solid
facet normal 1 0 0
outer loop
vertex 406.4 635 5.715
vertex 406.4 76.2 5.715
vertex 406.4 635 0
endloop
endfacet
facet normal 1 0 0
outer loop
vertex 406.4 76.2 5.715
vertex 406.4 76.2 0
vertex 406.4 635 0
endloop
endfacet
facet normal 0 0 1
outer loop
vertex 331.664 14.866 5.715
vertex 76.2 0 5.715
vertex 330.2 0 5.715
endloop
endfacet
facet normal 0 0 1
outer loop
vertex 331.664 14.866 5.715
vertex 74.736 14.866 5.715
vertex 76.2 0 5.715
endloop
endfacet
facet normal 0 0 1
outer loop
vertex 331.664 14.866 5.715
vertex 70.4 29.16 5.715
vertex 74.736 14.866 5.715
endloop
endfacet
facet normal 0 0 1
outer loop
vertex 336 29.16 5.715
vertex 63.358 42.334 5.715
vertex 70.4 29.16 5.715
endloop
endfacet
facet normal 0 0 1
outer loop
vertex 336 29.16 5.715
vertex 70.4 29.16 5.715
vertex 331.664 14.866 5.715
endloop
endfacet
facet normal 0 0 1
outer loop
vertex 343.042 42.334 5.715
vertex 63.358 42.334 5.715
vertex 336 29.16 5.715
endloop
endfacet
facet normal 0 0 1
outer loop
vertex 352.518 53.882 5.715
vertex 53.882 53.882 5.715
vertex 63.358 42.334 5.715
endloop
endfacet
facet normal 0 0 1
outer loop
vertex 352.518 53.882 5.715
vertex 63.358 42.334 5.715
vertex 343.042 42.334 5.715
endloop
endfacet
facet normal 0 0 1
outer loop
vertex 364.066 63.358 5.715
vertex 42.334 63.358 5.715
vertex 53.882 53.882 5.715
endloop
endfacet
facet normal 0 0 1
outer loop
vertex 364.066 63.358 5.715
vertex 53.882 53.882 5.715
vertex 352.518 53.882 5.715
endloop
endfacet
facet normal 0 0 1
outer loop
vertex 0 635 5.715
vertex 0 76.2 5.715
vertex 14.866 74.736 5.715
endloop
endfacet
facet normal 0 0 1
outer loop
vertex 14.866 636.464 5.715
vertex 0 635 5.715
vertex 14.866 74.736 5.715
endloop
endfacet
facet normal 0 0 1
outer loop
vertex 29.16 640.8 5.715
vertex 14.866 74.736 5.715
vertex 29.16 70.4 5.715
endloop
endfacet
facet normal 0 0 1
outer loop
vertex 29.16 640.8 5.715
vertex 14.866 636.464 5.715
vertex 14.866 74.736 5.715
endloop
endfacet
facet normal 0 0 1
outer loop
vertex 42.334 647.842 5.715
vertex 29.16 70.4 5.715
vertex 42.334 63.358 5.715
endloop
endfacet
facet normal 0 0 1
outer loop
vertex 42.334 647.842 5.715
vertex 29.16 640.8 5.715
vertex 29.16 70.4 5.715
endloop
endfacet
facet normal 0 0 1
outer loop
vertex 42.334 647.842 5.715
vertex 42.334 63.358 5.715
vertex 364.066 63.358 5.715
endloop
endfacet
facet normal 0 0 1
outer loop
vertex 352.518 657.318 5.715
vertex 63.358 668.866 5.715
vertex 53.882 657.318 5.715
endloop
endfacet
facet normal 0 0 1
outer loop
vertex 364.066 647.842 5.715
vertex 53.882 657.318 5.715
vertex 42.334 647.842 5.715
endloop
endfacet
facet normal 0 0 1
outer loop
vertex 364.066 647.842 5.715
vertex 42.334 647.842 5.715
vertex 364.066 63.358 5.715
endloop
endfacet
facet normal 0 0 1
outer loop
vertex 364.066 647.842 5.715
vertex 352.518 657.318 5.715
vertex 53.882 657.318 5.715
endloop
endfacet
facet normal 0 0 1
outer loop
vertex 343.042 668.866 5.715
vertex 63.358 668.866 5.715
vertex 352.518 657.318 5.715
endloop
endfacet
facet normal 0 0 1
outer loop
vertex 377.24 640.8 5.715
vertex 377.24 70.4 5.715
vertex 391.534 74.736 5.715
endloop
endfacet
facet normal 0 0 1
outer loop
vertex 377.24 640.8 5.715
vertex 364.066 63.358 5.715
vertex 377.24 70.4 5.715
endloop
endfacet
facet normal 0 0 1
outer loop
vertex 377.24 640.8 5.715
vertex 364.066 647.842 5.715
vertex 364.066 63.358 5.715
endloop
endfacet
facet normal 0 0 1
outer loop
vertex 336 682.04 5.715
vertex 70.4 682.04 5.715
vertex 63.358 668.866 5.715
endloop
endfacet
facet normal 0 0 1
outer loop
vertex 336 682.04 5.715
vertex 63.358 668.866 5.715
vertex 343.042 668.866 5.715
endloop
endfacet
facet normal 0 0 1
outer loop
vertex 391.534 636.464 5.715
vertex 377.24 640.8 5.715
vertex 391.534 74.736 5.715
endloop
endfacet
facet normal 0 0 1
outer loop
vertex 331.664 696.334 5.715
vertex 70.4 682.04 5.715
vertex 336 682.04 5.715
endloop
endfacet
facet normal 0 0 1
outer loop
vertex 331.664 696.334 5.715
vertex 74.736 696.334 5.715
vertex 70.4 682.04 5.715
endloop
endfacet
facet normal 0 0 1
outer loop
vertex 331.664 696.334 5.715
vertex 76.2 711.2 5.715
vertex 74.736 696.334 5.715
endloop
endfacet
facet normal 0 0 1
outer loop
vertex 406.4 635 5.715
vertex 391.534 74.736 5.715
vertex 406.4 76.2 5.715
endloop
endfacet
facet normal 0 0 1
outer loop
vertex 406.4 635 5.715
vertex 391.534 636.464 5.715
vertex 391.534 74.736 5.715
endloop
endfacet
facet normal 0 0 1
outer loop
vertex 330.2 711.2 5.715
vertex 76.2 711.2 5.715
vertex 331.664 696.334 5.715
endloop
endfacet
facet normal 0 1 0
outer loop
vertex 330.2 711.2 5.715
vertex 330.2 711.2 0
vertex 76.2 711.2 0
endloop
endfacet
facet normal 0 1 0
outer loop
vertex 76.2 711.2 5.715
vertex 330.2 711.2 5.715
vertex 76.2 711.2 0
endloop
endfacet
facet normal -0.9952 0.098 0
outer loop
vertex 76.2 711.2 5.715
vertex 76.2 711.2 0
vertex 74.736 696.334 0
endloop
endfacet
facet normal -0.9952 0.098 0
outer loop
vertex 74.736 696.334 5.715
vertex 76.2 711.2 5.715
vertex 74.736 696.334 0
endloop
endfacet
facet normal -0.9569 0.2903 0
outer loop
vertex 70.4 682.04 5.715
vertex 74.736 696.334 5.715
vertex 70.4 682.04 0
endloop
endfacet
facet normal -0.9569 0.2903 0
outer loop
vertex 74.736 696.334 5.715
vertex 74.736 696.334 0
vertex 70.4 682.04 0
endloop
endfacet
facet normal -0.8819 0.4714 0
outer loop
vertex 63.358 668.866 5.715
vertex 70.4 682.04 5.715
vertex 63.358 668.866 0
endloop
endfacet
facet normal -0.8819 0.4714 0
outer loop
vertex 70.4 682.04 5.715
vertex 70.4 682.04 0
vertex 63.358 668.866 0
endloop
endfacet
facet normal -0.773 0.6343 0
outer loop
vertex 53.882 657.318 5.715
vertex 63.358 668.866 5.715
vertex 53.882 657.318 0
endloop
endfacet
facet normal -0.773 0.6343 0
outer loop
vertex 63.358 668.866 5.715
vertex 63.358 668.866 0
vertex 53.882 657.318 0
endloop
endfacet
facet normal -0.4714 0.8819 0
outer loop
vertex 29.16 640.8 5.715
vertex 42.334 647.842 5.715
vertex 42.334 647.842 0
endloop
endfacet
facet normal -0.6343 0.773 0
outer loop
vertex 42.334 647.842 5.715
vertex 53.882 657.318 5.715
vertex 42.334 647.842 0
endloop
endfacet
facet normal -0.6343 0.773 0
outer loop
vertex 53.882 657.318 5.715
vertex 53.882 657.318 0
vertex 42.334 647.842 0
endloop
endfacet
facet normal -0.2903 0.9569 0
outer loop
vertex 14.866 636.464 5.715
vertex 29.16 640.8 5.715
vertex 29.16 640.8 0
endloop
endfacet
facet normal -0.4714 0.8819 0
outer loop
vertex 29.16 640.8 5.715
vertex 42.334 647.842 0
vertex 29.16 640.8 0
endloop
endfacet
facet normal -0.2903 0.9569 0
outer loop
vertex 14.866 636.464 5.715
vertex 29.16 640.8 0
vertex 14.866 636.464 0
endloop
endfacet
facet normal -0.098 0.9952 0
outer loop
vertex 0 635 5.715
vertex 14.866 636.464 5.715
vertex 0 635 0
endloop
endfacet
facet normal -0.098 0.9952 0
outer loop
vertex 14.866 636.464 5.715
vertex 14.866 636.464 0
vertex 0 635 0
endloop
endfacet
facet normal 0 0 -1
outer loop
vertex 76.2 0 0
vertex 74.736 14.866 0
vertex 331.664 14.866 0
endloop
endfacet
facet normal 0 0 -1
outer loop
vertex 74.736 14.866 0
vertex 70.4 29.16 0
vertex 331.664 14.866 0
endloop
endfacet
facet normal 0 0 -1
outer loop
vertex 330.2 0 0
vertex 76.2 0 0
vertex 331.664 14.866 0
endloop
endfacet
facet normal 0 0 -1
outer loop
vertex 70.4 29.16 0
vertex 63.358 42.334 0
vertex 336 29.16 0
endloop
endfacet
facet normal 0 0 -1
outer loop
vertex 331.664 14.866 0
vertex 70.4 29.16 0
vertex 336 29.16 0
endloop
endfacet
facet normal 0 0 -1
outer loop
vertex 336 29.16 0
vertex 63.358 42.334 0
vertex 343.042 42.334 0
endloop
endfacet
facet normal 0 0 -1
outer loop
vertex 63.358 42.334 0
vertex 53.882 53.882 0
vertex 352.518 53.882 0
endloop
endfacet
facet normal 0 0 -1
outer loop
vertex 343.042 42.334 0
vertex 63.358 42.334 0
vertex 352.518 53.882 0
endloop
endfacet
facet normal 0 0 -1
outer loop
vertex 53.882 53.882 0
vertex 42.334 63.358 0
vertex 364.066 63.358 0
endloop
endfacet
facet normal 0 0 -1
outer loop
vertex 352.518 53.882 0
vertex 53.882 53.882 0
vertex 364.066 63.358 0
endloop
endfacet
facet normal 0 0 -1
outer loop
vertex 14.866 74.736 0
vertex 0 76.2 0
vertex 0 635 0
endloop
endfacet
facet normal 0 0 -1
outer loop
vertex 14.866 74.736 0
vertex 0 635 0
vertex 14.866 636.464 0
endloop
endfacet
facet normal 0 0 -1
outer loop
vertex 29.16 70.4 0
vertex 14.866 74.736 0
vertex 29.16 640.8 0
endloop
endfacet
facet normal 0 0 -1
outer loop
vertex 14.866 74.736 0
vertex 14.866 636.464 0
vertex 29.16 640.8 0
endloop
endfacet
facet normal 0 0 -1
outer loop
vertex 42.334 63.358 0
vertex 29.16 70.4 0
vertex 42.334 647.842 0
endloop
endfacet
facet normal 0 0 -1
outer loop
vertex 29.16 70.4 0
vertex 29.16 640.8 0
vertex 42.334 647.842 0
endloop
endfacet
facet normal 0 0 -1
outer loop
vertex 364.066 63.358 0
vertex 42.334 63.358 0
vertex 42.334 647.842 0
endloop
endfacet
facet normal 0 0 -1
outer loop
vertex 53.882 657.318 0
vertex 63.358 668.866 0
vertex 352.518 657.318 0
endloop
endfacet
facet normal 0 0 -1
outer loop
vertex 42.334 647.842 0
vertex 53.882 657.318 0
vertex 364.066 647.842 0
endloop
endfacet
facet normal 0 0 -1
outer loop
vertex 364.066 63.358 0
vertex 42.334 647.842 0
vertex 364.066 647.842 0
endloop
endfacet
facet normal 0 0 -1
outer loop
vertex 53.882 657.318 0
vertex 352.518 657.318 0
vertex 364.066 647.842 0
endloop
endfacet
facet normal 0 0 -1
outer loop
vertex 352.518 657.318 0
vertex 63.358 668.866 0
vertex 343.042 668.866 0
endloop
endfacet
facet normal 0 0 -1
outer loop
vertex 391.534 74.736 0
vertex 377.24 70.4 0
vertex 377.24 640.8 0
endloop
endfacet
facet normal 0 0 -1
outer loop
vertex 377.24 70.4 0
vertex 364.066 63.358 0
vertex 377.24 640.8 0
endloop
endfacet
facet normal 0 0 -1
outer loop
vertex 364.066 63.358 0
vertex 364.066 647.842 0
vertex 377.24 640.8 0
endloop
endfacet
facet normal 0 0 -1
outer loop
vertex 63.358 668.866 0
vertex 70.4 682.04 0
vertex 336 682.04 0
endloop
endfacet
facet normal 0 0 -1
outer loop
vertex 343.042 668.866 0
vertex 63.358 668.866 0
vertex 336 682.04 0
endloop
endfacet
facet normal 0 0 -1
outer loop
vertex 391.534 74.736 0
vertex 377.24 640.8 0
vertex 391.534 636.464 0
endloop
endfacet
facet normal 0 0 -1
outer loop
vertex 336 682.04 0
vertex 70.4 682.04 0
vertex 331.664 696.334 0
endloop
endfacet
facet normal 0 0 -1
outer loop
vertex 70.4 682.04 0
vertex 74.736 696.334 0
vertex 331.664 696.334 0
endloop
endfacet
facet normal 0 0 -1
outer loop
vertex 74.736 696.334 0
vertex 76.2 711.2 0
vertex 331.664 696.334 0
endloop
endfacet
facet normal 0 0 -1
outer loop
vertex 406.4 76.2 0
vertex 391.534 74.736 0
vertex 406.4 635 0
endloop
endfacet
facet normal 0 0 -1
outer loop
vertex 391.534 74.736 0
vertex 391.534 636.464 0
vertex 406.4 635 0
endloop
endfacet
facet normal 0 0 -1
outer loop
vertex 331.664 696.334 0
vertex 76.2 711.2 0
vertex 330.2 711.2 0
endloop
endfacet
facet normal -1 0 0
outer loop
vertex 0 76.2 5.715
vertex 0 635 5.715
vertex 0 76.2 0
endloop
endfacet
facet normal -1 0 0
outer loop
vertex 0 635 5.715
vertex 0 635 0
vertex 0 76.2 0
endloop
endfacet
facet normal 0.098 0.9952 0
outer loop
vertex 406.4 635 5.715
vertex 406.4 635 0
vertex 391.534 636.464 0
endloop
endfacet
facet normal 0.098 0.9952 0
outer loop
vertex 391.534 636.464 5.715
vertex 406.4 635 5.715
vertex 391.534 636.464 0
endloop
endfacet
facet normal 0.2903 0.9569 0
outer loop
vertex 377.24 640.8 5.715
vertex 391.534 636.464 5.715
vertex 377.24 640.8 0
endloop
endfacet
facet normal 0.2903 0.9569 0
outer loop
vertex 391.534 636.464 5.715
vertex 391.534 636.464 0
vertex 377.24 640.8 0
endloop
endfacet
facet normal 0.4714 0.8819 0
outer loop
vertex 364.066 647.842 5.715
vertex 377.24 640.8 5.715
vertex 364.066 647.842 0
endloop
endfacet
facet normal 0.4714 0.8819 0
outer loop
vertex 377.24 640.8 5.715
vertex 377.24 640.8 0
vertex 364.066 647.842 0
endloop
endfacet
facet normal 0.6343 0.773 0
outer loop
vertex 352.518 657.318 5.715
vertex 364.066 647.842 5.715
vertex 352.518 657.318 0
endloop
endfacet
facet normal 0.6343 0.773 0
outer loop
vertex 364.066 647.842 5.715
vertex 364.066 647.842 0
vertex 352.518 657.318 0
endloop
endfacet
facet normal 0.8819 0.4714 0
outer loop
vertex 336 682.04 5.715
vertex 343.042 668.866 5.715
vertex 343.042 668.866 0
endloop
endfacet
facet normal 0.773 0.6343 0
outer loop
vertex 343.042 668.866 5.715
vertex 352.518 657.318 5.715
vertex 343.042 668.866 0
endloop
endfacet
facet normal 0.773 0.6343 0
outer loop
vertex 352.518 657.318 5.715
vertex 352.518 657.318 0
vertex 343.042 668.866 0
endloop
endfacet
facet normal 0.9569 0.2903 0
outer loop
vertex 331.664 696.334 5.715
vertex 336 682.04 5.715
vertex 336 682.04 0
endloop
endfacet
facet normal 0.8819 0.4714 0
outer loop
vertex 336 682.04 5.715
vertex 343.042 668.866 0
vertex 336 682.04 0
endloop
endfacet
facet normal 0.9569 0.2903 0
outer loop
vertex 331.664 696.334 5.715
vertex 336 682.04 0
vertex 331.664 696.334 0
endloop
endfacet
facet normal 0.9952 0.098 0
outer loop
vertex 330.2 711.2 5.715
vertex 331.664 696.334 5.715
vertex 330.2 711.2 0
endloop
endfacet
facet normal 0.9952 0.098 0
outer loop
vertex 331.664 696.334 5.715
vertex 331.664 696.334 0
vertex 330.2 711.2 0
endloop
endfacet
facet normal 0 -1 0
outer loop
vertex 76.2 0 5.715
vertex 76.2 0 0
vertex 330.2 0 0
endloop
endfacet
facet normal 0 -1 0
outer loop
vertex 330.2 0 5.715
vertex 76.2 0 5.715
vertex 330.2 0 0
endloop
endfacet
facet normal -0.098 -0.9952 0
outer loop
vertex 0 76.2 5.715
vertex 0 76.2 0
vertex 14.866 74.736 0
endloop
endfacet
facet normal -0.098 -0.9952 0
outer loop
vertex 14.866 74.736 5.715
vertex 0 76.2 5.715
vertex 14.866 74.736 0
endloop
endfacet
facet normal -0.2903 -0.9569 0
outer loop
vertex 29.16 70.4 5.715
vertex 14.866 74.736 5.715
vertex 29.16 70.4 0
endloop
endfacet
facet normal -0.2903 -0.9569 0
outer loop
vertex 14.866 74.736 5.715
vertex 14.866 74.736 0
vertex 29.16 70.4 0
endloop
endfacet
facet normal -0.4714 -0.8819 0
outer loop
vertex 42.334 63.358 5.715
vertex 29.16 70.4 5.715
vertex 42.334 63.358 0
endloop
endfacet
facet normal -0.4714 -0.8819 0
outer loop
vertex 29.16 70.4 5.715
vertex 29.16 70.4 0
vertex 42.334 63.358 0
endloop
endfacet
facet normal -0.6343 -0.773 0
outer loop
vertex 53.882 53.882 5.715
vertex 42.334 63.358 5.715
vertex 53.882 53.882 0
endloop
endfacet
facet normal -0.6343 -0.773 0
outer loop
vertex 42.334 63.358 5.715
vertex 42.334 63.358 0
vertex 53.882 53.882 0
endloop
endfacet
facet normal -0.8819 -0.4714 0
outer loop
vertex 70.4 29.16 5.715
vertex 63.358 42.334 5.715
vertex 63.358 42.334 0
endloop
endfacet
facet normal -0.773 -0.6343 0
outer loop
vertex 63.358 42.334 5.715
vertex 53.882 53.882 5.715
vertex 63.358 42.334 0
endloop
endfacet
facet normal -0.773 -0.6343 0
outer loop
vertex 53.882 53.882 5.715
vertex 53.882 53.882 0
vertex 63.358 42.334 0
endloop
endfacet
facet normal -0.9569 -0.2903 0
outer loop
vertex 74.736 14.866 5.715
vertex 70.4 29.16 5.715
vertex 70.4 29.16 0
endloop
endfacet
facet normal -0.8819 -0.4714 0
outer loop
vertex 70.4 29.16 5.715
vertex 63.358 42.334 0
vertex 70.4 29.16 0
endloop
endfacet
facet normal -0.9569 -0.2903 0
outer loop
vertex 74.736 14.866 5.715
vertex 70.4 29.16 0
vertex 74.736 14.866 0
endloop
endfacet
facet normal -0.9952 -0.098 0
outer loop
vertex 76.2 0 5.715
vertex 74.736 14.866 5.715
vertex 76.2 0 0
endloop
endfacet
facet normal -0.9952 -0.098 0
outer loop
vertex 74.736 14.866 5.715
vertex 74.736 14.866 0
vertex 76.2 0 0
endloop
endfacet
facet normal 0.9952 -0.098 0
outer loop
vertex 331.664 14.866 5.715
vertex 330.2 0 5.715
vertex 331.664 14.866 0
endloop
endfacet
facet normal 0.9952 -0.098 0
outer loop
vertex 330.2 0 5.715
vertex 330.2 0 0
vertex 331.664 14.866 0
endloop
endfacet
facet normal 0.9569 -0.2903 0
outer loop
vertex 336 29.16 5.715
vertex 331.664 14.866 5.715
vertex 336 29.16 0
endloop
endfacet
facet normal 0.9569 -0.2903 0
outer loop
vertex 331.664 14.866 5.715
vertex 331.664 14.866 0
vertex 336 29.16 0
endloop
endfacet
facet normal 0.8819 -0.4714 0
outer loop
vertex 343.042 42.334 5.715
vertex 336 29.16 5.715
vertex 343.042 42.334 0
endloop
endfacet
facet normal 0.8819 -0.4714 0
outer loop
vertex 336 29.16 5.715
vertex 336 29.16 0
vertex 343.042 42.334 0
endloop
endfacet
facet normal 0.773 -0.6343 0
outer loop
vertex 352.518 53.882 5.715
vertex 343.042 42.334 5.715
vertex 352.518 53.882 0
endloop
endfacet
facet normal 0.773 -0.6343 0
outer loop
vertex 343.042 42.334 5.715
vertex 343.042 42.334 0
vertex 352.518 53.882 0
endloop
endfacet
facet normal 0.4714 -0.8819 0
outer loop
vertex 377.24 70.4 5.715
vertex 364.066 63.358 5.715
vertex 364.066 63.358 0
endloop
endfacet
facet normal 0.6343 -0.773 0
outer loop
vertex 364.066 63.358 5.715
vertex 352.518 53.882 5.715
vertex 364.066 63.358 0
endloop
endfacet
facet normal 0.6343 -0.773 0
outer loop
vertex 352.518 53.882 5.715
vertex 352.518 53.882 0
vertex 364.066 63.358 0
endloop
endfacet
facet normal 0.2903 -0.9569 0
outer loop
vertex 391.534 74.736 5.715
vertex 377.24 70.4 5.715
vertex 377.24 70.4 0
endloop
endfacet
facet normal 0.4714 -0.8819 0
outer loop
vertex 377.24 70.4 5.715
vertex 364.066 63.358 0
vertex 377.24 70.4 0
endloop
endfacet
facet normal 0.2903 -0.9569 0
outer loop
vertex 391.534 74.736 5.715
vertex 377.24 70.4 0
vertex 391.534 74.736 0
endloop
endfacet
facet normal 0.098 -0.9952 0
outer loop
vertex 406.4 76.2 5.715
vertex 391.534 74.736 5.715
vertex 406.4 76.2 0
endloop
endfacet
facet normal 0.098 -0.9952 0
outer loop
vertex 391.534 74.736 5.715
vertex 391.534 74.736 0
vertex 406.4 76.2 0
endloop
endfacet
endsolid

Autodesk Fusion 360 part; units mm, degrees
sketch "Sketch1" plane through (0, 0, 0) normal (0, 0, 1) x (1, 0, 0)
  line L0 (0, 0) -> (406.4, 0)
  line L1 (406.4, 0) -> (406.4, 711.2)
  line L2 (406.4, 711.2) -> (0, 711.2)
  line L3 (0, 711.2) -> (0, 0)
  arc A0 (0, 635) -> (76.2, 711.2) centre (0, 711.2) ccw
  arc A1 (330.2, 711.2) -> (406.4, 635) centre (406.4, 711.2) ccw
  arc A2 (76.2, 0) -> (0, 76.2) centre (0, 0) ccw
  arc A3 (406.4, 76.2) -> (330.2, 0) centre (406.4, 0) ccw
  dimension "d1" = 406.4
  dimension "d2" = 711.2
  dimension "d5" = 152.4
  dimension "d6" = 152.4
  dimension "d7" = 152.4
  dimension "d8" = 152.4
extrude "Extrude1" add sketch "Sketch1" along normal blind 5.715 contours L0 L1 L2 L3 A0 A1 A2 A3 makes body 1
copy_body "Body->Comp1" bodies 1 removing the originals makes body 2 in component "Component"
component "Component" placed x (1, 0, 0) y (0, 1, 0) z (0, 0, 1) at (0, 0, 0)
